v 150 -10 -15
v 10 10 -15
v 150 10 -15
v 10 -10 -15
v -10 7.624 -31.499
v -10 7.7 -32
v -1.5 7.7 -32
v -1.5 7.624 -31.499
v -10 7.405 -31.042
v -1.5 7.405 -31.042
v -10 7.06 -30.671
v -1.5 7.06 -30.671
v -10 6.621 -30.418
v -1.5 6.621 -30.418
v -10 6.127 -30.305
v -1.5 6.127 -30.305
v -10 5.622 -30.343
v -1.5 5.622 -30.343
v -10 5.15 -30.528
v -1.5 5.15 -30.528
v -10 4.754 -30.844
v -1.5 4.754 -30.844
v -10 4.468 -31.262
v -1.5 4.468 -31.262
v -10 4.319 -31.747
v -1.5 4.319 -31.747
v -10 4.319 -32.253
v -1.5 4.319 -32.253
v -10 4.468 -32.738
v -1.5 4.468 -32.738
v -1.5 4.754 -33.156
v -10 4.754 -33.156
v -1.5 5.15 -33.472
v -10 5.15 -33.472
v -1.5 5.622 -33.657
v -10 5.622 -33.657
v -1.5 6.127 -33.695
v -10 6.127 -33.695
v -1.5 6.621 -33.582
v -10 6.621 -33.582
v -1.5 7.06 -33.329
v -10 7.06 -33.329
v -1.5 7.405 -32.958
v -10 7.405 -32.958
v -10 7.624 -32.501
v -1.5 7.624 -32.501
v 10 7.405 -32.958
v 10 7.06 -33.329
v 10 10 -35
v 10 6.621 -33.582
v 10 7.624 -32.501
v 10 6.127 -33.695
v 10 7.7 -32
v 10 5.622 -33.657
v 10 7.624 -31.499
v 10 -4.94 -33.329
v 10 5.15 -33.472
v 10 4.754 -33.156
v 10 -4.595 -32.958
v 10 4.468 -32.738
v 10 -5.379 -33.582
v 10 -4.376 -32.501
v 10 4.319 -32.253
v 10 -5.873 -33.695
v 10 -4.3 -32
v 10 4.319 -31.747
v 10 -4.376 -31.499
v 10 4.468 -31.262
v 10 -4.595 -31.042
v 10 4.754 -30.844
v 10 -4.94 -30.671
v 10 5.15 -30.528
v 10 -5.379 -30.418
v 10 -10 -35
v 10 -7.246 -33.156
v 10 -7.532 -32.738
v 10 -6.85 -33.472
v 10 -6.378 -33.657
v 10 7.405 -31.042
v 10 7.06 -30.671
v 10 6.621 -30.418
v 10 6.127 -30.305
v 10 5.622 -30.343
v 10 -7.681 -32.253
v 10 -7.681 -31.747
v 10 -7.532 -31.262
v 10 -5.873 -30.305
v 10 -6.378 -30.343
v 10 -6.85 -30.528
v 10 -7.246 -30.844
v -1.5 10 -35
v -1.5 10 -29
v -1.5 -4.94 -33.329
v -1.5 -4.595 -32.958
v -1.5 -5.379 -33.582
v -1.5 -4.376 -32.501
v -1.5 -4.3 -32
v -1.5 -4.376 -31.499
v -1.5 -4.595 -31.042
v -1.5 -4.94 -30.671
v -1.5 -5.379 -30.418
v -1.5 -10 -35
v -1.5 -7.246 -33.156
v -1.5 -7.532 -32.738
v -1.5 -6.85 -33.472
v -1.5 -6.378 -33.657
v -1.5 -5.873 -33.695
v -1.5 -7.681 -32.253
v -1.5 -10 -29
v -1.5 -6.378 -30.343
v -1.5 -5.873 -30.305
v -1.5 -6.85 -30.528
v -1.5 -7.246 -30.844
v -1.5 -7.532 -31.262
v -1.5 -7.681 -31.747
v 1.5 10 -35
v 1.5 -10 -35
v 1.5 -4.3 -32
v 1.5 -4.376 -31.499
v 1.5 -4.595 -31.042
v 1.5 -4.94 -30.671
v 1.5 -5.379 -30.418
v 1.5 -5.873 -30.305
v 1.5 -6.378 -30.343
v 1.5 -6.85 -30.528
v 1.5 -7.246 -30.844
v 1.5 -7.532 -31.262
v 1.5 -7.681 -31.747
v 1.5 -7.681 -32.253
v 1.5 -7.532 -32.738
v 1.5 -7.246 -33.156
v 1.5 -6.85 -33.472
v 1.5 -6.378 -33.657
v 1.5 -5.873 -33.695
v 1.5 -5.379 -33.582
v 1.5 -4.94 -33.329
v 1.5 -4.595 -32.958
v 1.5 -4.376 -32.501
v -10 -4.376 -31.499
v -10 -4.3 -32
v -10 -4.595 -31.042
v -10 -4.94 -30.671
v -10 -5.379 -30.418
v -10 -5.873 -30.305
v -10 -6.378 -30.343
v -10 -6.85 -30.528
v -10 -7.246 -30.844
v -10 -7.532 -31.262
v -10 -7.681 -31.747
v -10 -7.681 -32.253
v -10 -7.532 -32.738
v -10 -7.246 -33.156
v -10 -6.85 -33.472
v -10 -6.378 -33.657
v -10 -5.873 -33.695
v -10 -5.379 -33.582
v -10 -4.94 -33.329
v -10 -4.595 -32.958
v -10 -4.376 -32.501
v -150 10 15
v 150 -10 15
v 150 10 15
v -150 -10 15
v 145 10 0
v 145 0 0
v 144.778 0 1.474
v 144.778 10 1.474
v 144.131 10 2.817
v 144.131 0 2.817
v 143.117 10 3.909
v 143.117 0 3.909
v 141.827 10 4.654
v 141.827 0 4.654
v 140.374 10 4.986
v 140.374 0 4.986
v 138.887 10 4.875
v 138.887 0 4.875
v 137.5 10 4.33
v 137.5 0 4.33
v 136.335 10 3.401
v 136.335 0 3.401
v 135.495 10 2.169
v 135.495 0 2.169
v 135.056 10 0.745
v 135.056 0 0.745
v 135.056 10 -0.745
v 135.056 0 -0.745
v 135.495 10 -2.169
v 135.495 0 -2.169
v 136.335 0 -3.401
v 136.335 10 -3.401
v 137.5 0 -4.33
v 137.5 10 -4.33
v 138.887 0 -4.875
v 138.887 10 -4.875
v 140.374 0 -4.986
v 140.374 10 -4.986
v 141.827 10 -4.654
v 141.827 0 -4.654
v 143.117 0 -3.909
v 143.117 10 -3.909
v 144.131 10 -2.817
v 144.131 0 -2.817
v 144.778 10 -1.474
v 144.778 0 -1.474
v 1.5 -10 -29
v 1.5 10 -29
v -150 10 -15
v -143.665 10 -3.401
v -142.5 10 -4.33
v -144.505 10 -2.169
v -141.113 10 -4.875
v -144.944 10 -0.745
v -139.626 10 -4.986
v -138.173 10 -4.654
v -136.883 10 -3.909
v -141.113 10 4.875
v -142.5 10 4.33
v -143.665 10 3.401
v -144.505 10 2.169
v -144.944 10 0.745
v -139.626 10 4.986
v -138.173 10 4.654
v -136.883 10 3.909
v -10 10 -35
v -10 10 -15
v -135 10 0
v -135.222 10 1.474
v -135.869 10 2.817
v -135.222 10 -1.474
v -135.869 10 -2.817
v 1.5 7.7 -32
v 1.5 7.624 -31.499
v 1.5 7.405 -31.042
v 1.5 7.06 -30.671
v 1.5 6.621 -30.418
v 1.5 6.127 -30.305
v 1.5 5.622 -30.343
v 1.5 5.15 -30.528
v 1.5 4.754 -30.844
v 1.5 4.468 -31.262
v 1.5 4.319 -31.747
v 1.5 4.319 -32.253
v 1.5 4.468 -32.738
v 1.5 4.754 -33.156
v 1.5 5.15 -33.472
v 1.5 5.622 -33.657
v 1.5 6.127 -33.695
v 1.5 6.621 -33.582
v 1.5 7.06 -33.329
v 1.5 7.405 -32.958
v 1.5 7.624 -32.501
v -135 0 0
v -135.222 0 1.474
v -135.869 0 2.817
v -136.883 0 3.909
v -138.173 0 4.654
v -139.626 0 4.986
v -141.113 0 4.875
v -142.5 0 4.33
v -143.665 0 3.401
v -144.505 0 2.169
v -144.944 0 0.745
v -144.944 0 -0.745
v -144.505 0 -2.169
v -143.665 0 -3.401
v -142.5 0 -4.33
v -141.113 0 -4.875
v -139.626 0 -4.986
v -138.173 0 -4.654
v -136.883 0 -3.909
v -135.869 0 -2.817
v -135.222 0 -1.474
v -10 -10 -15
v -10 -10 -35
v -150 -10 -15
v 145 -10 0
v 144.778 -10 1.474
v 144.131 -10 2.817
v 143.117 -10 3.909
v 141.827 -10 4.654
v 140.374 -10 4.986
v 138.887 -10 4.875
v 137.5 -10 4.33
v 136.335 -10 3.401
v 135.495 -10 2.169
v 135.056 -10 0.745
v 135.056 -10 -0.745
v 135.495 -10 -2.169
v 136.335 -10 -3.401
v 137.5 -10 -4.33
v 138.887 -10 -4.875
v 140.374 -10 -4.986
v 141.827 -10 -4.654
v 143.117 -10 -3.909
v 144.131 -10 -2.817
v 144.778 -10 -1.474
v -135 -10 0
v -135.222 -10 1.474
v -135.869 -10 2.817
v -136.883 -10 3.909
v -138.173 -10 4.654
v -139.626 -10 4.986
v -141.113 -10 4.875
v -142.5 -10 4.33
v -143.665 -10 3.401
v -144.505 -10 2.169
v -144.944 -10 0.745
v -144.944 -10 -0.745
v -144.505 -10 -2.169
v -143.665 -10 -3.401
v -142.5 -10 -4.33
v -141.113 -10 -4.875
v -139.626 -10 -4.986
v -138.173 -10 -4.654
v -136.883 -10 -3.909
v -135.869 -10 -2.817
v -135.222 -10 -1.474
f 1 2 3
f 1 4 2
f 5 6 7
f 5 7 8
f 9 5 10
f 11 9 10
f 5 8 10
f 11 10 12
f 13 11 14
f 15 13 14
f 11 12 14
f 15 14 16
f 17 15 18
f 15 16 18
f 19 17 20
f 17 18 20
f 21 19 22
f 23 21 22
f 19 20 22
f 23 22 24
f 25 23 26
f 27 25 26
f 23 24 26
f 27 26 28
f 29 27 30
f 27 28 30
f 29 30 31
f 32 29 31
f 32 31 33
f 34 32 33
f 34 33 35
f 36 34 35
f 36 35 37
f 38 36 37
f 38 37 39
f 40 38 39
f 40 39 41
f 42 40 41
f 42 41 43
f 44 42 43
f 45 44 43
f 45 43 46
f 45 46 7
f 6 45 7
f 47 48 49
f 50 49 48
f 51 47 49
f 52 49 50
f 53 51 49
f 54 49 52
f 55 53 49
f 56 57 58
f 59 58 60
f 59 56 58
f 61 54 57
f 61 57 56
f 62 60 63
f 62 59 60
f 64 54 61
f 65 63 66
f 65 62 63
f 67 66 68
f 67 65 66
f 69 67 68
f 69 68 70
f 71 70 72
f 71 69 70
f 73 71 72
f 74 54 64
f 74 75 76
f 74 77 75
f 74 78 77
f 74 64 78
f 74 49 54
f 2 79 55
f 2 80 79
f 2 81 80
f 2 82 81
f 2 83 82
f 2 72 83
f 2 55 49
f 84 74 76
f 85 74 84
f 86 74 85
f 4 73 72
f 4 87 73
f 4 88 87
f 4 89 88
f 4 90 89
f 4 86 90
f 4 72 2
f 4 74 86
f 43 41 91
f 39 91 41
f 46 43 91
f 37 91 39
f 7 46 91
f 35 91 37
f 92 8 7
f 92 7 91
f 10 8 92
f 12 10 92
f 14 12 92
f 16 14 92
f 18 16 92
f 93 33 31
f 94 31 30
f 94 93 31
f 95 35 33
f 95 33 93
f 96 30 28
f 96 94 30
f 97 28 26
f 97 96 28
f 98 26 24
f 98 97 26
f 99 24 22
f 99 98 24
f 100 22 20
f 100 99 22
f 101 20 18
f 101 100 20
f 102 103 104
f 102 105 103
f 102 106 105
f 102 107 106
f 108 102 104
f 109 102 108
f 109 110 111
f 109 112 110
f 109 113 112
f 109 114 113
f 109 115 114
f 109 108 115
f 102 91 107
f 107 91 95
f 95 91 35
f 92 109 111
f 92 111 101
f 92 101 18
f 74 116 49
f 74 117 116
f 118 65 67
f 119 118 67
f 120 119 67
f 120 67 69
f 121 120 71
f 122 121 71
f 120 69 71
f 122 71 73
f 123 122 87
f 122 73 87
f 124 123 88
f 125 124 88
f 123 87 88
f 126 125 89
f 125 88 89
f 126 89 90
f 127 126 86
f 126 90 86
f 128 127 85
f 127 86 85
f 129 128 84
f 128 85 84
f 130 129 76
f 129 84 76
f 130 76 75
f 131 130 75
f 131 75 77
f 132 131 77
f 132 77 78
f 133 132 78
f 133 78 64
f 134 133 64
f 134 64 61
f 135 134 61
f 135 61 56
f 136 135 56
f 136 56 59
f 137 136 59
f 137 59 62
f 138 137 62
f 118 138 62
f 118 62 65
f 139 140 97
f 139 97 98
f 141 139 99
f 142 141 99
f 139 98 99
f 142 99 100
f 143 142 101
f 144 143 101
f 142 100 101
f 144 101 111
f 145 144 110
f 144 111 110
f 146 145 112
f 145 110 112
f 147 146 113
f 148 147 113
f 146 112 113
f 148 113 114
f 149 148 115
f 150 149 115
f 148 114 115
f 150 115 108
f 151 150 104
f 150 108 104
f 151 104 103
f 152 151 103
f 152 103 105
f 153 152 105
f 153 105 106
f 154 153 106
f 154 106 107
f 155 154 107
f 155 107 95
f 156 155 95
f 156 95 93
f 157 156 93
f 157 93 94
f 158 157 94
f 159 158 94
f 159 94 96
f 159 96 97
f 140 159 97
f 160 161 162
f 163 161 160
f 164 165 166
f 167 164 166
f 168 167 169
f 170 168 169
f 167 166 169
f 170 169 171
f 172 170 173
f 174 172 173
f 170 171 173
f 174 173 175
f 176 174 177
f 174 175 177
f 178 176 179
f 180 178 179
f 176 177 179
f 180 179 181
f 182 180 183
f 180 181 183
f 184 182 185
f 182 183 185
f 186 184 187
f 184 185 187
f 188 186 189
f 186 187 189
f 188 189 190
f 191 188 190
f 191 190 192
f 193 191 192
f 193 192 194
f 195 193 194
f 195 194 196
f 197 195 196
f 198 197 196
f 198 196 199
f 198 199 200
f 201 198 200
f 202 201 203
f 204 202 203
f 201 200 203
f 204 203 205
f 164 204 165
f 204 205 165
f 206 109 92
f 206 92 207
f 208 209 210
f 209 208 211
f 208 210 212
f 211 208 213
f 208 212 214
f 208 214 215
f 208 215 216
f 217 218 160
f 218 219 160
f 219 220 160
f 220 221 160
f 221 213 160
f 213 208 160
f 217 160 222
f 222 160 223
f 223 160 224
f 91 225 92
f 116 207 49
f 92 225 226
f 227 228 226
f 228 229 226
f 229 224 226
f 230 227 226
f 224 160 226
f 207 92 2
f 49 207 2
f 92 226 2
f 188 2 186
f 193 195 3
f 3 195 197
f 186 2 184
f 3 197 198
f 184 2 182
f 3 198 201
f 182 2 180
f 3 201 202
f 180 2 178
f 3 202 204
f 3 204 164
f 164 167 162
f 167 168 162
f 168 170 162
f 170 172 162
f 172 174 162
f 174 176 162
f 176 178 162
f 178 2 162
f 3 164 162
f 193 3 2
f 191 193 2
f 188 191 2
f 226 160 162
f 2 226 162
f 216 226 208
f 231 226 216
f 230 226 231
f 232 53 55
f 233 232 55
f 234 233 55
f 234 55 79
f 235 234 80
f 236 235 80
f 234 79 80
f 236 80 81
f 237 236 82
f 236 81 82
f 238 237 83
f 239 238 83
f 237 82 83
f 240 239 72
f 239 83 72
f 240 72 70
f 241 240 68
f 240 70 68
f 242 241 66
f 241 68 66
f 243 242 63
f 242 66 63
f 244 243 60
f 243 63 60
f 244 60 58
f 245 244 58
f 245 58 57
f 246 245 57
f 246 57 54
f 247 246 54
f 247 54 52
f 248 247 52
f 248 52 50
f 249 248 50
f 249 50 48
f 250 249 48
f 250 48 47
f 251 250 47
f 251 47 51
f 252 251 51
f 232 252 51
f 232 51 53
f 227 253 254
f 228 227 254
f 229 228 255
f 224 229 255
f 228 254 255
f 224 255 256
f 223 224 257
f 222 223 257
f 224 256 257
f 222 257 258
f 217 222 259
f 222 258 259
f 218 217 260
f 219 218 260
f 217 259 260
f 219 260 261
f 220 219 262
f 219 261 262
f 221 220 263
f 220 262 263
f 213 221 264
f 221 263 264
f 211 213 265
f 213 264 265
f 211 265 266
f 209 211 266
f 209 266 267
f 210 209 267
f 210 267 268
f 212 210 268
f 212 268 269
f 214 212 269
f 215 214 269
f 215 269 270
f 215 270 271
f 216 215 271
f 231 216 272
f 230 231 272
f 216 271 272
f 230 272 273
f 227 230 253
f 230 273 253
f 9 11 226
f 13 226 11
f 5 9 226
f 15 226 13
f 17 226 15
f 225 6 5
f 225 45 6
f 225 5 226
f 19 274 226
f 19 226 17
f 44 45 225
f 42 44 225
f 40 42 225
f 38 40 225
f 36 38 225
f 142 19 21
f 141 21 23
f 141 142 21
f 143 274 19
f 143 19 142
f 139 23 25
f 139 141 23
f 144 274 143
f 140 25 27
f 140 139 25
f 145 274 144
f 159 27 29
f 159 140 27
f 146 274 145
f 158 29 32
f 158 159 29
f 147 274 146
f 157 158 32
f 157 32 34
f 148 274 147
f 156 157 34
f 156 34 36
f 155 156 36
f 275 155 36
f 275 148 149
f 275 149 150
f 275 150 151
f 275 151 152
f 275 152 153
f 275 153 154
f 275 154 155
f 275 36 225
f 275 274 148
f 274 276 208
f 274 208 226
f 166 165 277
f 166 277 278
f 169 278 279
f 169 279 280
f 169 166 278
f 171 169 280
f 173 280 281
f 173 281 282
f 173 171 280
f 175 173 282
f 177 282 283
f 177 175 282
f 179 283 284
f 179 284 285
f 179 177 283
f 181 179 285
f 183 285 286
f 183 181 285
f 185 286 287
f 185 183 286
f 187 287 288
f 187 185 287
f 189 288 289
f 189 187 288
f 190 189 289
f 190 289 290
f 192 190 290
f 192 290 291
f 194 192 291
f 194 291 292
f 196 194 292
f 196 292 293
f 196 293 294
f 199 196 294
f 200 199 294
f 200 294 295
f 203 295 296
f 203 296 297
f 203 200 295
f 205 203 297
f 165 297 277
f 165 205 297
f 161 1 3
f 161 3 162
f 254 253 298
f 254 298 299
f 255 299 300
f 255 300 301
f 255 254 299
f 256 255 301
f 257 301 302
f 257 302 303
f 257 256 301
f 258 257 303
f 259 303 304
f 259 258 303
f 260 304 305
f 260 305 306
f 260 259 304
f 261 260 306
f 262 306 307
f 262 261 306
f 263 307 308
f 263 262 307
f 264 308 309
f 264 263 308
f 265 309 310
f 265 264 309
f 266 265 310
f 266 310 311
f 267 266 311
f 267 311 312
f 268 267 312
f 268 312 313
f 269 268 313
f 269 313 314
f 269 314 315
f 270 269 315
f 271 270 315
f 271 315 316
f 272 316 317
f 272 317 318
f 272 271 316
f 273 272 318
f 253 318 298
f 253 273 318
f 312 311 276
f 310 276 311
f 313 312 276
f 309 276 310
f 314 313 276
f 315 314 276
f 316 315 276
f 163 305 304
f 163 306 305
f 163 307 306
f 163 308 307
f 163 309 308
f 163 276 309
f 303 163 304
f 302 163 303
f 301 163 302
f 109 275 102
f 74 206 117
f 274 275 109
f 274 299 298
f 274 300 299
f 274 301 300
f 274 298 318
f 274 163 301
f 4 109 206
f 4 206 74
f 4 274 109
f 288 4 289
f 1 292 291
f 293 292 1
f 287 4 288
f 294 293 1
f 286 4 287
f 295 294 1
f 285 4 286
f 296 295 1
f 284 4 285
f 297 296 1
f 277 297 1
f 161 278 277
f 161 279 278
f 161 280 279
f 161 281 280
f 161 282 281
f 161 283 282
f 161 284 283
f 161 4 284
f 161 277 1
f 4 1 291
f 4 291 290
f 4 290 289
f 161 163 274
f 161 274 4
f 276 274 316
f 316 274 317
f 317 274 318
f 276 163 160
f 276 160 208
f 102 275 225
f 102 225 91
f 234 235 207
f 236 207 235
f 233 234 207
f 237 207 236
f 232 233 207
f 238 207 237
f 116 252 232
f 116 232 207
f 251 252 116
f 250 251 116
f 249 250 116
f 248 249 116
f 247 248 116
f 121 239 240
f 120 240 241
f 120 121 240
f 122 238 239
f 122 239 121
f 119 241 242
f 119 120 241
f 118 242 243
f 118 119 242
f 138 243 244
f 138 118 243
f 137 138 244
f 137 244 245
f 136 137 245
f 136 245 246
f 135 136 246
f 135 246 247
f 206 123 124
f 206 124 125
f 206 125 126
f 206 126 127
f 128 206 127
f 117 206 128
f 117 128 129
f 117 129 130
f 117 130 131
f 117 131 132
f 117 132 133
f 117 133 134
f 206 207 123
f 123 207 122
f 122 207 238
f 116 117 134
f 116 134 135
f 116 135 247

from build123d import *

# Parameters (mm, degrees)
F0_R          = 5
F0_W          = 20
F0_H          = 20
F1_DEPTH      = 10
F1_DEPTH_BACK = 10
F2_R          = 1.7
F3_DEPTH      = 25


with BuildPart() as f1:
    # F0 (on Front) → F1 (new body, two sides)
    with BuildSketch(Plane.XZ) as f1_sk:
        Polygon((10, -15), (150, -15), (150, 15), (-150, 15), (-150, -15), (-10, -15), (-10, 5), (10, 5), align=None)
        with Locations((-140, 0)):
            Circle(F0_R, mode=Mode.SUBTRACT)
        with Locations((140, 0)):
            Circle(F0_R, mode=Mode.SUBTRACT)
        Polygon((10, -35), (10, -15), (-10, -15), (-10, -35), (-1.5, -35), (-1.5, -29), (1.5, -29), (1.5, -35), align=None)
        with Locations((0, -5)):
            Rectangle(F0_W, F0_H)
    extrude(amount=F1_DEPTH)
    extrude(f1_sk.sketch, amount=-F1_DEPTH_BACK)

    # F2 (on face) → F3 (cut)
    with BuildSketch(Plane.YZ.offset(10)):
        with Locations((-6, -32)):
            Circle(F2_R)
        with Locations((6, -32)):
            Circle(F2_R)
    extrude(amount=-F3_DEPTH, mode=Mode.SUBTRACT)


solid = f1.part
